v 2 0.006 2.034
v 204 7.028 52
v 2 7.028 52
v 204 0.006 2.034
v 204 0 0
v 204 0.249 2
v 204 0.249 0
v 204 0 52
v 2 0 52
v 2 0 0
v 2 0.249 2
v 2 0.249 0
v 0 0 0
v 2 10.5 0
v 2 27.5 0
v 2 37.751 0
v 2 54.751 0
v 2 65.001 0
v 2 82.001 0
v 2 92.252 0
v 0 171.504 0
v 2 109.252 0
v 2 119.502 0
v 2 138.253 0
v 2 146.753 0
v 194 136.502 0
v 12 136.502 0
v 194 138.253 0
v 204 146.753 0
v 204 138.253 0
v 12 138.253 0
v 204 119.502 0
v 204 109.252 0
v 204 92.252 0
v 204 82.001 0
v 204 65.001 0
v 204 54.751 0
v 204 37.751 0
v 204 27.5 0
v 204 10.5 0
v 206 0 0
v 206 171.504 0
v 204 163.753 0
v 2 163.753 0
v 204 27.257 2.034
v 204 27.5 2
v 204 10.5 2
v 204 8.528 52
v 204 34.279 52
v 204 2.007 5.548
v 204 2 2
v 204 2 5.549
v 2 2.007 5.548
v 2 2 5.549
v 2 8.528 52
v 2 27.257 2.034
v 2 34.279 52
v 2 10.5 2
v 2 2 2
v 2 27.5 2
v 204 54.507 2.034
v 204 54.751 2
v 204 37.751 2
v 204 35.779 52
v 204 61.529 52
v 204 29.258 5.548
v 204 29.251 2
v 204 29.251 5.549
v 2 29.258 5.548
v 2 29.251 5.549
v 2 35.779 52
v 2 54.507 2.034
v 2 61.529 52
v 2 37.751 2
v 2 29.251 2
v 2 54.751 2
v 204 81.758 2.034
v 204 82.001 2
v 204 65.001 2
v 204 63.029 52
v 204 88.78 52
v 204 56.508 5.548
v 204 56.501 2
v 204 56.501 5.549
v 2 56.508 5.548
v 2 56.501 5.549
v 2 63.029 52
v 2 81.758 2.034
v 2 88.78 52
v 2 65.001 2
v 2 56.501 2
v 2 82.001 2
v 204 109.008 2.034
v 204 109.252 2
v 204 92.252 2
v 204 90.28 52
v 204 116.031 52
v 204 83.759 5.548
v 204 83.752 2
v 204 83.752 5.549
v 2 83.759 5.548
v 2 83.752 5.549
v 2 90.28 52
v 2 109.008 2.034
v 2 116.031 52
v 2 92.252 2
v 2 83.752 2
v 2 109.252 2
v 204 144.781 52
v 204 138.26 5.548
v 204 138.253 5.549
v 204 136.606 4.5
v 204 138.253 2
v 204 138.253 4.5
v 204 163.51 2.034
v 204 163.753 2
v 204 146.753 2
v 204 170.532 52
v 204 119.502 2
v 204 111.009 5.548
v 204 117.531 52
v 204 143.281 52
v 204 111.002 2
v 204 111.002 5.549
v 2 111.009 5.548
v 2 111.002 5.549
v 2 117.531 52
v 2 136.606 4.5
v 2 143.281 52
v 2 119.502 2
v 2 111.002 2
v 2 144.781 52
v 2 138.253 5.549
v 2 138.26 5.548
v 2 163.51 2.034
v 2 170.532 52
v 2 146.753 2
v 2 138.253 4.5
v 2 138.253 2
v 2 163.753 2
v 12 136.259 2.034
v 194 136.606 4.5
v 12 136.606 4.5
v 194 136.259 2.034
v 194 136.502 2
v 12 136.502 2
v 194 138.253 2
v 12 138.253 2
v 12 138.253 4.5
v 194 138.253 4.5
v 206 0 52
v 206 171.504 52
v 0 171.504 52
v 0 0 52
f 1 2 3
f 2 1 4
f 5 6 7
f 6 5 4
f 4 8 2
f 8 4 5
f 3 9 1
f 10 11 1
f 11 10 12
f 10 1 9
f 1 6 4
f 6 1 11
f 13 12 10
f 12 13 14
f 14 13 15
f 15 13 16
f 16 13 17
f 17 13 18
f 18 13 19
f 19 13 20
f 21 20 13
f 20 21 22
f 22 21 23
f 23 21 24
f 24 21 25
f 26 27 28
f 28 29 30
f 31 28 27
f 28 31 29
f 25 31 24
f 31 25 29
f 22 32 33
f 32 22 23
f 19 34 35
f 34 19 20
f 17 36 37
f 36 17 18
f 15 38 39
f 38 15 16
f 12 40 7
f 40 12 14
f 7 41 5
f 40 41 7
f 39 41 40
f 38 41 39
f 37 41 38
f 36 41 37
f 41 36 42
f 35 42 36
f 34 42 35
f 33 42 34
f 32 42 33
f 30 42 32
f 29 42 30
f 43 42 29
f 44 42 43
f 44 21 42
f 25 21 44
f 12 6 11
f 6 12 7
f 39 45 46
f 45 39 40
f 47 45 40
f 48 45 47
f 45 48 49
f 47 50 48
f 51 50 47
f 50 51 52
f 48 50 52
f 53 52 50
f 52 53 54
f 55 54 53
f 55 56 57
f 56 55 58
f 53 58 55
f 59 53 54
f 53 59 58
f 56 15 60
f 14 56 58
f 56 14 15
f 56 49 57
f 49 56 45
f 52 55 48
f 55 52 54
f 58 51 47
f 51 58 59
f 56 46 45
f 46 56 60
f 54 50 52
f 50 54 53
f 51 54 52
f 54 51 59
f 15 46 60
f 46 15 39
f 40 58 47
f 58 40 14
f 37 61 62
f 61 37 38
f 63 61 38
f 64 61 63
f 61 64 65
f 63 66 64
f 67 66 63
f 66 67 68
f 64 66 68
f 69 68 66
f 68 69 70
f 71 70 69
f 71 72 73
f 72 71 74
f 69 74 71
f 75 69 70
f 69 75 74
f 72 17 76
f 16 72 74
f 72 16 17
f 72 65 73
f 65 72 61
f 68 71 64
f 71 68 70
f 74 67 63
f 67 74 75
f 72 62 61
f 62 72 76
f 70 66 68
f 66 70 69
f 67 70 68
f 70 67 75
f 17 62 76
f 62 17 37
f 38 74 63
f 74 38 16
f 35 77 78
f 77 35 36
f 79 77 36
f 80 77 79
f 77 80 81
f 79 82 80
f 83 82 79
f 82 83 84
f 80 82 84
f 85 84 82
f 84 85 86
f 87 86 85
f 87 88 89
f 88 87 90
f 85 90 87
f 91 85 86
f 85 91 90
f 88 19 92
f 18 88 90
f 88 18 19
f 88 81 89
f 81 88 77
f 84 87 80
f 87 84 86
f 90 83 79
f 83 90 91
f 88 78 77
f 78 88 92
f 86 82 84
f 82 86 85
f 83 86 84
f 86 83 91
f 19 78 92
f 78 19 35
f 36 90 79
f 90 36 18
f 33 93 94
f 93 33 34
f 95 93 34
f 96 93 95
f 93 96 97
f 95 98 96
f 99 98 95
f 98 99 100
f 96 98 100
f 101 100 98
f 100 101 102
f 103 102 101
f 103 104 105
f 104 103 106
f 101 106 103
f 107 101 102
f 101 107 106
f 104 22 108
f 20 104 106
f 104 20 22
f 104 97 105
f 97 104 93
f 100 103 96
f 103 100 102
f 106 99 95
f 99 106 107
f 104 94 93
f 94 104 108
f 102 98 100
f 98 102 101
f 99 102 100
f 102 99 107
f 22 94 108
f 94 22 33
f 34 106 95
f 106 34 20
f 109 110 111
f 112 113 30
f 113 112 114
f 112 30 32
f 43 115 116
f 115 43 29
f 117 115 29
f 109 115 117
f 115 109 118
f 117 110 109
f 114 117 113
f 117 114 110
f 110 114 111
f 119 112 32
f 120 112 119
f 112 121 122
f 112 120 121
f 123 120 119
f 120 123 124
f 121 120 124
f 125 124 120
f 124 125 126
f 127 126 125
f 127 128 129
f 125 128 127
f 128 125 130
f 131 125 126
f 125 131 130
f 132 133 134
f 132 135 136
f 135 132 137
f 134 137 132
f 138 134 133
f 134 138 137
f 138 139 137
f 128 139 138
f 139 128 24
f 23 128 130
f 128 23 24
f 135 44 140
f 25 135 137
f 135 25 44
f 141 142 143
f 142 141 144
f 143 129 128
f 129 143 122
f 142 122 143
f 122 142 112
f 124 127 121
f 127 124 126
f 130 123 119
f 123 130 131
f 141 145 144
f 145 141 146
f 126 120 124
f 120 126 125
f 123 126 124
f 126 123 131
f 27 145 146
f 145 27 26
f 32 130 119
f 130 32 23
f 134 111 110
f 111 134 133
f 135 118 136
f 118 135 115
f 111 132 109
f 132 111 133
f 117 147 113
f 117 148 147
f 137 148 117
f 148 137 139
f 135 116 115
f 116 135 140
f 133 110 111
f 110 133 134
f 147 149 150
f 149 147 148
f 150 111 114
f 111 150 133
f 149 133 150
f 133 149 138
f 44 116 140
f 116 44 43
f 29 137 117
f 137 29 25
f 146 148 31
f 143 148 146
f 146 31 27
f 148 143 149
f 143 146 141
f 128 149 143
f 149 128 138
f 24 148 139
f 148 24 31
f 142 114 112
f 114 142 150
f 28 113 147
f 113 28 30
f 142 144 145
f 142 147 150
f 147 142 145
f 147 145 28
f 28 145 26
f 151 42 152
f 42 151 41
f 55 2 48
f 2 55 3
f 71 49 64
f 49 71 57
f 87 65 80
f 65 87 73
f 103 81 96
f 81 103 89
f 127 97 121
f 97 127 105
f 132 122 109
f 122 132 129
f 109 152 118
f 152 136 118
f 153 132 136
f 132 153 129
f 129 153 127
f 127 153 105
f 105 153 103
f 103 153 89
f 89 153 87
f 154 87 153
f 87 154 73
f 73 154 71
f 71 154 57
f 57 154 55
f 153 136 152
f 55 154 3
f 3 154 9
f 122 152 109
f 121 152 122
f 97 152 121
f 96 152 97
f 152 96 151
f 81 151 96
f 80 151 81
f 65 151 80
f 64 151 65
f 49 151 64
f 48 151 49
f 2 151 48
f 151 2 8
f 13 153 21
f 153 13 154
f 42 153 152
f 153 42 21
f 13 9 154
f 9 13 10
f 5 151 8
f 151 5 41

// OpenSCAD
//UM2 Cura
max_width = 215;
max_height = 197;
//max_height = 223;
depth = 50;
outer_thickness = 2;

shelf_height = 25.5;

inner_thickness = 1.5;
no_shelves = 6;
shelf_angle = 8;
given_max_height = 200;


// offset because of rotation
shelf_offset_z = sin(shelf_angle) * shelf_height;
shelf_offset_y = shelf_height/cos(shelf_angle);


//width = 200; // Fits 8 bottles (circumference a little less than 25mm in averege)
width = 202; // After first test, it was a bit cramped. 2mm extra seems reasonable


height = min(max_height - 2*outer_thickness, no_shelves*(shelf_offset_y+inner_thickness) + outer_thickness*2, given_max_height);


hanger_attachment_width = 10;
hanger_marginal = 0.5;


// TODO: Translate with pythagoras and sinus? Since we rotate
module hull() {
    cube([width+outer_thickness*2, height+outer_thickness*2, depth+outer_thickness]);
}

module shelf_crevice(no, top) {
    
   translate([0, no*(shelf_offset_y+inner_thickness), shelf_offset_z+outer_thickness])    
     rotate([-shelf_angle, 0, 0])
       cube([width, shelf_height, depth+shelf_offset_z]);
 
   translate([0, no*(shelf_offset_y+inner_thickness), outer_thickness]) 
     rotate([90, 0, 90]) 
        linear_extrude(height = width)
           polygon([[0, 0], [0, shelf_offset_z], [shelf_height, 0]]);
   
   // cutaway upper part of each shelf for saving material
   cutout_ratio = 2/3;
   translate([0, no*(shelf_offset_y+inner_thickness) + shelf_height*(1 - cutout_ratio), 0]) 
      cube([width, shelf_height*cutout_ratio, outer_thickness]);
   
}


module shelves() {
    translate([outer_thickness, outer_thickness, 0])    
        for(shelf_no = [-1: 1 : no_shelves-1]) {
          shelf_crevice(shelf_no);
        }    
}

hook_thickness = 2;

module hanger_cutout() {
    // translate as shelves themselves
    translate([outer_thickness, outer_thickness, outer_thickness])
    // also translate to upmost shelf
    translate([0, (no_shelves-1)*(shelf_offset_y+inner_thickness), 0])
    // but maybe also translate so the hanger is at the lower part when attached, making
    // as little impact as possible on dropper bottle depth
    translate([0, -shelf_height/2, 0])
    translate([0, 0, -outer_thickness]) {
        hole();
        translate([width, 0, 0])
        mirror([1, 0, 0])
        hole();
    }    
    
  
    module hole() {
        cube([hanger_attachment_width, shelf_height/2, outer_thickness+hook_thickness+hanger_marginal]);
    }  
}


module hanger() {
    cube([width, shelf_height, hook_thickness]);
    hook();
    translate([width, 0, 0])
        mirror([1, 0, 0])
            hook();
    
    module hook() {  
        margin = 0.2;      
        translate([margin/2, 0, hook_thickness]) {
            cube([hanger_attachment_width, 4, hook_thickness]);
            translate([0, 0, hook_thickness])
                cube([hanger_attachment_width, shelf_height/2, hook_thickness]);
        }
    }
}


epsilon = 0.1;

// strength_factor, holder_height, hol_spacing, holder_total_x
holder_total_x = width;
// hole spacing
hole_spacing = 25.4*4;
// hole size
hole_size = 3;
clip_height = 2*hole_size + 2;
// board thickness
board_thickness = 5;


strength_factor = 1;
holder_height = height;





module pin(clip)
{
	rotate([0,0,15])
	cylinder(r=hole_size/2, h=board_thickness*1.5+epsilon, center=true, $fn=12);

	if (clip) {
		//
		rotate([0,0,90])
		intersection() {
			translate([0, 0, hole_size-epsilon])
				cube([hole_size+2*epsilon, clip_height, 2*hole_size], center=true);

			// [-hole_size/2 - 1.95,0, board_thickness/2]
			translate([0, hole_size/2 + 2, board_thickness/2]) 
				rotate([0, 90, 0])
				rotate_extrude(convexity = 5, $fn=20)
				translate([0.44*hole_size+2.36, 0, 0])
				 circle(r = (hole_size*0.95)/2); 
			
			translate([0, hole_size/2 + 2 - 1.6, board_thickness/2]) 
				rotate([45,0,0])
				translate([0, -0, hole_size*0.6])
					cube([hole_size+2*epsilon, 3*hole_size, hole_size], center=true);
		}
	}
}

module pinboard_clips() {
	rotate([0,90,0])
	for(i=[0:round(holder_total_x/hole_spacing)]) {
		for(j=[0:max(strength_factor, round(holder_height/hole_spacing))]) {

			translate([
				j*hole_spacing, 
				-hole_spacing*(round(holder_total_x/hole_spacing)/2) + i*hole_spacing, 
				0])
					pin(true);
		}
	}
}


module pinboard_hook() {
    hole_size = 4;
    hole_spacing = 25.4/2;
    board_thickness = 4;
    
    peg_square_side = sqrt(pow(hole_size, 2)/2);
    
    linear_extrude(peg_square_side)
        polygon(points = [
            [0,0]
            ,[hook_thickness, 0]
            ,[hook_thickness, -shelf_height/2+hook_thickness]
            ,[hook_thickness*2, -shelf_height/2+hook_thickness]
            ,[hook_thickness*2, 0]
            ,[hook_thickness*3, 0]
            ,[hook_thickness*3, -shelf_height/2]
            ,[hook_thickness, -shelf_height/2]
            // INSERT LENGTH HERE FOR SUPPORT
            ,[0, -shelf_height/2]
            ,[0, -peg_square_side]
            ,[-peg_square_side, -peg_square_side]
            ,[-2*peg_square_side, 0]
            ,[-2*peg_square_side, peg_square_side]
            ,[-peg_square_side, peg_square_side]
            ,[-peg_square_side, 0]
            
            ,[0, 0]
        
        ]);
}

difference() {
    hull();
    shelves();
    hanger_cutout();
}

 *translate([outer_thickness, height+30, 0]) {
    hanger(); 
    rotate([0, 90, 90])
        pinboard_clips();

}

*translate([0, 0, 0])
    pinboard_hook();
    
